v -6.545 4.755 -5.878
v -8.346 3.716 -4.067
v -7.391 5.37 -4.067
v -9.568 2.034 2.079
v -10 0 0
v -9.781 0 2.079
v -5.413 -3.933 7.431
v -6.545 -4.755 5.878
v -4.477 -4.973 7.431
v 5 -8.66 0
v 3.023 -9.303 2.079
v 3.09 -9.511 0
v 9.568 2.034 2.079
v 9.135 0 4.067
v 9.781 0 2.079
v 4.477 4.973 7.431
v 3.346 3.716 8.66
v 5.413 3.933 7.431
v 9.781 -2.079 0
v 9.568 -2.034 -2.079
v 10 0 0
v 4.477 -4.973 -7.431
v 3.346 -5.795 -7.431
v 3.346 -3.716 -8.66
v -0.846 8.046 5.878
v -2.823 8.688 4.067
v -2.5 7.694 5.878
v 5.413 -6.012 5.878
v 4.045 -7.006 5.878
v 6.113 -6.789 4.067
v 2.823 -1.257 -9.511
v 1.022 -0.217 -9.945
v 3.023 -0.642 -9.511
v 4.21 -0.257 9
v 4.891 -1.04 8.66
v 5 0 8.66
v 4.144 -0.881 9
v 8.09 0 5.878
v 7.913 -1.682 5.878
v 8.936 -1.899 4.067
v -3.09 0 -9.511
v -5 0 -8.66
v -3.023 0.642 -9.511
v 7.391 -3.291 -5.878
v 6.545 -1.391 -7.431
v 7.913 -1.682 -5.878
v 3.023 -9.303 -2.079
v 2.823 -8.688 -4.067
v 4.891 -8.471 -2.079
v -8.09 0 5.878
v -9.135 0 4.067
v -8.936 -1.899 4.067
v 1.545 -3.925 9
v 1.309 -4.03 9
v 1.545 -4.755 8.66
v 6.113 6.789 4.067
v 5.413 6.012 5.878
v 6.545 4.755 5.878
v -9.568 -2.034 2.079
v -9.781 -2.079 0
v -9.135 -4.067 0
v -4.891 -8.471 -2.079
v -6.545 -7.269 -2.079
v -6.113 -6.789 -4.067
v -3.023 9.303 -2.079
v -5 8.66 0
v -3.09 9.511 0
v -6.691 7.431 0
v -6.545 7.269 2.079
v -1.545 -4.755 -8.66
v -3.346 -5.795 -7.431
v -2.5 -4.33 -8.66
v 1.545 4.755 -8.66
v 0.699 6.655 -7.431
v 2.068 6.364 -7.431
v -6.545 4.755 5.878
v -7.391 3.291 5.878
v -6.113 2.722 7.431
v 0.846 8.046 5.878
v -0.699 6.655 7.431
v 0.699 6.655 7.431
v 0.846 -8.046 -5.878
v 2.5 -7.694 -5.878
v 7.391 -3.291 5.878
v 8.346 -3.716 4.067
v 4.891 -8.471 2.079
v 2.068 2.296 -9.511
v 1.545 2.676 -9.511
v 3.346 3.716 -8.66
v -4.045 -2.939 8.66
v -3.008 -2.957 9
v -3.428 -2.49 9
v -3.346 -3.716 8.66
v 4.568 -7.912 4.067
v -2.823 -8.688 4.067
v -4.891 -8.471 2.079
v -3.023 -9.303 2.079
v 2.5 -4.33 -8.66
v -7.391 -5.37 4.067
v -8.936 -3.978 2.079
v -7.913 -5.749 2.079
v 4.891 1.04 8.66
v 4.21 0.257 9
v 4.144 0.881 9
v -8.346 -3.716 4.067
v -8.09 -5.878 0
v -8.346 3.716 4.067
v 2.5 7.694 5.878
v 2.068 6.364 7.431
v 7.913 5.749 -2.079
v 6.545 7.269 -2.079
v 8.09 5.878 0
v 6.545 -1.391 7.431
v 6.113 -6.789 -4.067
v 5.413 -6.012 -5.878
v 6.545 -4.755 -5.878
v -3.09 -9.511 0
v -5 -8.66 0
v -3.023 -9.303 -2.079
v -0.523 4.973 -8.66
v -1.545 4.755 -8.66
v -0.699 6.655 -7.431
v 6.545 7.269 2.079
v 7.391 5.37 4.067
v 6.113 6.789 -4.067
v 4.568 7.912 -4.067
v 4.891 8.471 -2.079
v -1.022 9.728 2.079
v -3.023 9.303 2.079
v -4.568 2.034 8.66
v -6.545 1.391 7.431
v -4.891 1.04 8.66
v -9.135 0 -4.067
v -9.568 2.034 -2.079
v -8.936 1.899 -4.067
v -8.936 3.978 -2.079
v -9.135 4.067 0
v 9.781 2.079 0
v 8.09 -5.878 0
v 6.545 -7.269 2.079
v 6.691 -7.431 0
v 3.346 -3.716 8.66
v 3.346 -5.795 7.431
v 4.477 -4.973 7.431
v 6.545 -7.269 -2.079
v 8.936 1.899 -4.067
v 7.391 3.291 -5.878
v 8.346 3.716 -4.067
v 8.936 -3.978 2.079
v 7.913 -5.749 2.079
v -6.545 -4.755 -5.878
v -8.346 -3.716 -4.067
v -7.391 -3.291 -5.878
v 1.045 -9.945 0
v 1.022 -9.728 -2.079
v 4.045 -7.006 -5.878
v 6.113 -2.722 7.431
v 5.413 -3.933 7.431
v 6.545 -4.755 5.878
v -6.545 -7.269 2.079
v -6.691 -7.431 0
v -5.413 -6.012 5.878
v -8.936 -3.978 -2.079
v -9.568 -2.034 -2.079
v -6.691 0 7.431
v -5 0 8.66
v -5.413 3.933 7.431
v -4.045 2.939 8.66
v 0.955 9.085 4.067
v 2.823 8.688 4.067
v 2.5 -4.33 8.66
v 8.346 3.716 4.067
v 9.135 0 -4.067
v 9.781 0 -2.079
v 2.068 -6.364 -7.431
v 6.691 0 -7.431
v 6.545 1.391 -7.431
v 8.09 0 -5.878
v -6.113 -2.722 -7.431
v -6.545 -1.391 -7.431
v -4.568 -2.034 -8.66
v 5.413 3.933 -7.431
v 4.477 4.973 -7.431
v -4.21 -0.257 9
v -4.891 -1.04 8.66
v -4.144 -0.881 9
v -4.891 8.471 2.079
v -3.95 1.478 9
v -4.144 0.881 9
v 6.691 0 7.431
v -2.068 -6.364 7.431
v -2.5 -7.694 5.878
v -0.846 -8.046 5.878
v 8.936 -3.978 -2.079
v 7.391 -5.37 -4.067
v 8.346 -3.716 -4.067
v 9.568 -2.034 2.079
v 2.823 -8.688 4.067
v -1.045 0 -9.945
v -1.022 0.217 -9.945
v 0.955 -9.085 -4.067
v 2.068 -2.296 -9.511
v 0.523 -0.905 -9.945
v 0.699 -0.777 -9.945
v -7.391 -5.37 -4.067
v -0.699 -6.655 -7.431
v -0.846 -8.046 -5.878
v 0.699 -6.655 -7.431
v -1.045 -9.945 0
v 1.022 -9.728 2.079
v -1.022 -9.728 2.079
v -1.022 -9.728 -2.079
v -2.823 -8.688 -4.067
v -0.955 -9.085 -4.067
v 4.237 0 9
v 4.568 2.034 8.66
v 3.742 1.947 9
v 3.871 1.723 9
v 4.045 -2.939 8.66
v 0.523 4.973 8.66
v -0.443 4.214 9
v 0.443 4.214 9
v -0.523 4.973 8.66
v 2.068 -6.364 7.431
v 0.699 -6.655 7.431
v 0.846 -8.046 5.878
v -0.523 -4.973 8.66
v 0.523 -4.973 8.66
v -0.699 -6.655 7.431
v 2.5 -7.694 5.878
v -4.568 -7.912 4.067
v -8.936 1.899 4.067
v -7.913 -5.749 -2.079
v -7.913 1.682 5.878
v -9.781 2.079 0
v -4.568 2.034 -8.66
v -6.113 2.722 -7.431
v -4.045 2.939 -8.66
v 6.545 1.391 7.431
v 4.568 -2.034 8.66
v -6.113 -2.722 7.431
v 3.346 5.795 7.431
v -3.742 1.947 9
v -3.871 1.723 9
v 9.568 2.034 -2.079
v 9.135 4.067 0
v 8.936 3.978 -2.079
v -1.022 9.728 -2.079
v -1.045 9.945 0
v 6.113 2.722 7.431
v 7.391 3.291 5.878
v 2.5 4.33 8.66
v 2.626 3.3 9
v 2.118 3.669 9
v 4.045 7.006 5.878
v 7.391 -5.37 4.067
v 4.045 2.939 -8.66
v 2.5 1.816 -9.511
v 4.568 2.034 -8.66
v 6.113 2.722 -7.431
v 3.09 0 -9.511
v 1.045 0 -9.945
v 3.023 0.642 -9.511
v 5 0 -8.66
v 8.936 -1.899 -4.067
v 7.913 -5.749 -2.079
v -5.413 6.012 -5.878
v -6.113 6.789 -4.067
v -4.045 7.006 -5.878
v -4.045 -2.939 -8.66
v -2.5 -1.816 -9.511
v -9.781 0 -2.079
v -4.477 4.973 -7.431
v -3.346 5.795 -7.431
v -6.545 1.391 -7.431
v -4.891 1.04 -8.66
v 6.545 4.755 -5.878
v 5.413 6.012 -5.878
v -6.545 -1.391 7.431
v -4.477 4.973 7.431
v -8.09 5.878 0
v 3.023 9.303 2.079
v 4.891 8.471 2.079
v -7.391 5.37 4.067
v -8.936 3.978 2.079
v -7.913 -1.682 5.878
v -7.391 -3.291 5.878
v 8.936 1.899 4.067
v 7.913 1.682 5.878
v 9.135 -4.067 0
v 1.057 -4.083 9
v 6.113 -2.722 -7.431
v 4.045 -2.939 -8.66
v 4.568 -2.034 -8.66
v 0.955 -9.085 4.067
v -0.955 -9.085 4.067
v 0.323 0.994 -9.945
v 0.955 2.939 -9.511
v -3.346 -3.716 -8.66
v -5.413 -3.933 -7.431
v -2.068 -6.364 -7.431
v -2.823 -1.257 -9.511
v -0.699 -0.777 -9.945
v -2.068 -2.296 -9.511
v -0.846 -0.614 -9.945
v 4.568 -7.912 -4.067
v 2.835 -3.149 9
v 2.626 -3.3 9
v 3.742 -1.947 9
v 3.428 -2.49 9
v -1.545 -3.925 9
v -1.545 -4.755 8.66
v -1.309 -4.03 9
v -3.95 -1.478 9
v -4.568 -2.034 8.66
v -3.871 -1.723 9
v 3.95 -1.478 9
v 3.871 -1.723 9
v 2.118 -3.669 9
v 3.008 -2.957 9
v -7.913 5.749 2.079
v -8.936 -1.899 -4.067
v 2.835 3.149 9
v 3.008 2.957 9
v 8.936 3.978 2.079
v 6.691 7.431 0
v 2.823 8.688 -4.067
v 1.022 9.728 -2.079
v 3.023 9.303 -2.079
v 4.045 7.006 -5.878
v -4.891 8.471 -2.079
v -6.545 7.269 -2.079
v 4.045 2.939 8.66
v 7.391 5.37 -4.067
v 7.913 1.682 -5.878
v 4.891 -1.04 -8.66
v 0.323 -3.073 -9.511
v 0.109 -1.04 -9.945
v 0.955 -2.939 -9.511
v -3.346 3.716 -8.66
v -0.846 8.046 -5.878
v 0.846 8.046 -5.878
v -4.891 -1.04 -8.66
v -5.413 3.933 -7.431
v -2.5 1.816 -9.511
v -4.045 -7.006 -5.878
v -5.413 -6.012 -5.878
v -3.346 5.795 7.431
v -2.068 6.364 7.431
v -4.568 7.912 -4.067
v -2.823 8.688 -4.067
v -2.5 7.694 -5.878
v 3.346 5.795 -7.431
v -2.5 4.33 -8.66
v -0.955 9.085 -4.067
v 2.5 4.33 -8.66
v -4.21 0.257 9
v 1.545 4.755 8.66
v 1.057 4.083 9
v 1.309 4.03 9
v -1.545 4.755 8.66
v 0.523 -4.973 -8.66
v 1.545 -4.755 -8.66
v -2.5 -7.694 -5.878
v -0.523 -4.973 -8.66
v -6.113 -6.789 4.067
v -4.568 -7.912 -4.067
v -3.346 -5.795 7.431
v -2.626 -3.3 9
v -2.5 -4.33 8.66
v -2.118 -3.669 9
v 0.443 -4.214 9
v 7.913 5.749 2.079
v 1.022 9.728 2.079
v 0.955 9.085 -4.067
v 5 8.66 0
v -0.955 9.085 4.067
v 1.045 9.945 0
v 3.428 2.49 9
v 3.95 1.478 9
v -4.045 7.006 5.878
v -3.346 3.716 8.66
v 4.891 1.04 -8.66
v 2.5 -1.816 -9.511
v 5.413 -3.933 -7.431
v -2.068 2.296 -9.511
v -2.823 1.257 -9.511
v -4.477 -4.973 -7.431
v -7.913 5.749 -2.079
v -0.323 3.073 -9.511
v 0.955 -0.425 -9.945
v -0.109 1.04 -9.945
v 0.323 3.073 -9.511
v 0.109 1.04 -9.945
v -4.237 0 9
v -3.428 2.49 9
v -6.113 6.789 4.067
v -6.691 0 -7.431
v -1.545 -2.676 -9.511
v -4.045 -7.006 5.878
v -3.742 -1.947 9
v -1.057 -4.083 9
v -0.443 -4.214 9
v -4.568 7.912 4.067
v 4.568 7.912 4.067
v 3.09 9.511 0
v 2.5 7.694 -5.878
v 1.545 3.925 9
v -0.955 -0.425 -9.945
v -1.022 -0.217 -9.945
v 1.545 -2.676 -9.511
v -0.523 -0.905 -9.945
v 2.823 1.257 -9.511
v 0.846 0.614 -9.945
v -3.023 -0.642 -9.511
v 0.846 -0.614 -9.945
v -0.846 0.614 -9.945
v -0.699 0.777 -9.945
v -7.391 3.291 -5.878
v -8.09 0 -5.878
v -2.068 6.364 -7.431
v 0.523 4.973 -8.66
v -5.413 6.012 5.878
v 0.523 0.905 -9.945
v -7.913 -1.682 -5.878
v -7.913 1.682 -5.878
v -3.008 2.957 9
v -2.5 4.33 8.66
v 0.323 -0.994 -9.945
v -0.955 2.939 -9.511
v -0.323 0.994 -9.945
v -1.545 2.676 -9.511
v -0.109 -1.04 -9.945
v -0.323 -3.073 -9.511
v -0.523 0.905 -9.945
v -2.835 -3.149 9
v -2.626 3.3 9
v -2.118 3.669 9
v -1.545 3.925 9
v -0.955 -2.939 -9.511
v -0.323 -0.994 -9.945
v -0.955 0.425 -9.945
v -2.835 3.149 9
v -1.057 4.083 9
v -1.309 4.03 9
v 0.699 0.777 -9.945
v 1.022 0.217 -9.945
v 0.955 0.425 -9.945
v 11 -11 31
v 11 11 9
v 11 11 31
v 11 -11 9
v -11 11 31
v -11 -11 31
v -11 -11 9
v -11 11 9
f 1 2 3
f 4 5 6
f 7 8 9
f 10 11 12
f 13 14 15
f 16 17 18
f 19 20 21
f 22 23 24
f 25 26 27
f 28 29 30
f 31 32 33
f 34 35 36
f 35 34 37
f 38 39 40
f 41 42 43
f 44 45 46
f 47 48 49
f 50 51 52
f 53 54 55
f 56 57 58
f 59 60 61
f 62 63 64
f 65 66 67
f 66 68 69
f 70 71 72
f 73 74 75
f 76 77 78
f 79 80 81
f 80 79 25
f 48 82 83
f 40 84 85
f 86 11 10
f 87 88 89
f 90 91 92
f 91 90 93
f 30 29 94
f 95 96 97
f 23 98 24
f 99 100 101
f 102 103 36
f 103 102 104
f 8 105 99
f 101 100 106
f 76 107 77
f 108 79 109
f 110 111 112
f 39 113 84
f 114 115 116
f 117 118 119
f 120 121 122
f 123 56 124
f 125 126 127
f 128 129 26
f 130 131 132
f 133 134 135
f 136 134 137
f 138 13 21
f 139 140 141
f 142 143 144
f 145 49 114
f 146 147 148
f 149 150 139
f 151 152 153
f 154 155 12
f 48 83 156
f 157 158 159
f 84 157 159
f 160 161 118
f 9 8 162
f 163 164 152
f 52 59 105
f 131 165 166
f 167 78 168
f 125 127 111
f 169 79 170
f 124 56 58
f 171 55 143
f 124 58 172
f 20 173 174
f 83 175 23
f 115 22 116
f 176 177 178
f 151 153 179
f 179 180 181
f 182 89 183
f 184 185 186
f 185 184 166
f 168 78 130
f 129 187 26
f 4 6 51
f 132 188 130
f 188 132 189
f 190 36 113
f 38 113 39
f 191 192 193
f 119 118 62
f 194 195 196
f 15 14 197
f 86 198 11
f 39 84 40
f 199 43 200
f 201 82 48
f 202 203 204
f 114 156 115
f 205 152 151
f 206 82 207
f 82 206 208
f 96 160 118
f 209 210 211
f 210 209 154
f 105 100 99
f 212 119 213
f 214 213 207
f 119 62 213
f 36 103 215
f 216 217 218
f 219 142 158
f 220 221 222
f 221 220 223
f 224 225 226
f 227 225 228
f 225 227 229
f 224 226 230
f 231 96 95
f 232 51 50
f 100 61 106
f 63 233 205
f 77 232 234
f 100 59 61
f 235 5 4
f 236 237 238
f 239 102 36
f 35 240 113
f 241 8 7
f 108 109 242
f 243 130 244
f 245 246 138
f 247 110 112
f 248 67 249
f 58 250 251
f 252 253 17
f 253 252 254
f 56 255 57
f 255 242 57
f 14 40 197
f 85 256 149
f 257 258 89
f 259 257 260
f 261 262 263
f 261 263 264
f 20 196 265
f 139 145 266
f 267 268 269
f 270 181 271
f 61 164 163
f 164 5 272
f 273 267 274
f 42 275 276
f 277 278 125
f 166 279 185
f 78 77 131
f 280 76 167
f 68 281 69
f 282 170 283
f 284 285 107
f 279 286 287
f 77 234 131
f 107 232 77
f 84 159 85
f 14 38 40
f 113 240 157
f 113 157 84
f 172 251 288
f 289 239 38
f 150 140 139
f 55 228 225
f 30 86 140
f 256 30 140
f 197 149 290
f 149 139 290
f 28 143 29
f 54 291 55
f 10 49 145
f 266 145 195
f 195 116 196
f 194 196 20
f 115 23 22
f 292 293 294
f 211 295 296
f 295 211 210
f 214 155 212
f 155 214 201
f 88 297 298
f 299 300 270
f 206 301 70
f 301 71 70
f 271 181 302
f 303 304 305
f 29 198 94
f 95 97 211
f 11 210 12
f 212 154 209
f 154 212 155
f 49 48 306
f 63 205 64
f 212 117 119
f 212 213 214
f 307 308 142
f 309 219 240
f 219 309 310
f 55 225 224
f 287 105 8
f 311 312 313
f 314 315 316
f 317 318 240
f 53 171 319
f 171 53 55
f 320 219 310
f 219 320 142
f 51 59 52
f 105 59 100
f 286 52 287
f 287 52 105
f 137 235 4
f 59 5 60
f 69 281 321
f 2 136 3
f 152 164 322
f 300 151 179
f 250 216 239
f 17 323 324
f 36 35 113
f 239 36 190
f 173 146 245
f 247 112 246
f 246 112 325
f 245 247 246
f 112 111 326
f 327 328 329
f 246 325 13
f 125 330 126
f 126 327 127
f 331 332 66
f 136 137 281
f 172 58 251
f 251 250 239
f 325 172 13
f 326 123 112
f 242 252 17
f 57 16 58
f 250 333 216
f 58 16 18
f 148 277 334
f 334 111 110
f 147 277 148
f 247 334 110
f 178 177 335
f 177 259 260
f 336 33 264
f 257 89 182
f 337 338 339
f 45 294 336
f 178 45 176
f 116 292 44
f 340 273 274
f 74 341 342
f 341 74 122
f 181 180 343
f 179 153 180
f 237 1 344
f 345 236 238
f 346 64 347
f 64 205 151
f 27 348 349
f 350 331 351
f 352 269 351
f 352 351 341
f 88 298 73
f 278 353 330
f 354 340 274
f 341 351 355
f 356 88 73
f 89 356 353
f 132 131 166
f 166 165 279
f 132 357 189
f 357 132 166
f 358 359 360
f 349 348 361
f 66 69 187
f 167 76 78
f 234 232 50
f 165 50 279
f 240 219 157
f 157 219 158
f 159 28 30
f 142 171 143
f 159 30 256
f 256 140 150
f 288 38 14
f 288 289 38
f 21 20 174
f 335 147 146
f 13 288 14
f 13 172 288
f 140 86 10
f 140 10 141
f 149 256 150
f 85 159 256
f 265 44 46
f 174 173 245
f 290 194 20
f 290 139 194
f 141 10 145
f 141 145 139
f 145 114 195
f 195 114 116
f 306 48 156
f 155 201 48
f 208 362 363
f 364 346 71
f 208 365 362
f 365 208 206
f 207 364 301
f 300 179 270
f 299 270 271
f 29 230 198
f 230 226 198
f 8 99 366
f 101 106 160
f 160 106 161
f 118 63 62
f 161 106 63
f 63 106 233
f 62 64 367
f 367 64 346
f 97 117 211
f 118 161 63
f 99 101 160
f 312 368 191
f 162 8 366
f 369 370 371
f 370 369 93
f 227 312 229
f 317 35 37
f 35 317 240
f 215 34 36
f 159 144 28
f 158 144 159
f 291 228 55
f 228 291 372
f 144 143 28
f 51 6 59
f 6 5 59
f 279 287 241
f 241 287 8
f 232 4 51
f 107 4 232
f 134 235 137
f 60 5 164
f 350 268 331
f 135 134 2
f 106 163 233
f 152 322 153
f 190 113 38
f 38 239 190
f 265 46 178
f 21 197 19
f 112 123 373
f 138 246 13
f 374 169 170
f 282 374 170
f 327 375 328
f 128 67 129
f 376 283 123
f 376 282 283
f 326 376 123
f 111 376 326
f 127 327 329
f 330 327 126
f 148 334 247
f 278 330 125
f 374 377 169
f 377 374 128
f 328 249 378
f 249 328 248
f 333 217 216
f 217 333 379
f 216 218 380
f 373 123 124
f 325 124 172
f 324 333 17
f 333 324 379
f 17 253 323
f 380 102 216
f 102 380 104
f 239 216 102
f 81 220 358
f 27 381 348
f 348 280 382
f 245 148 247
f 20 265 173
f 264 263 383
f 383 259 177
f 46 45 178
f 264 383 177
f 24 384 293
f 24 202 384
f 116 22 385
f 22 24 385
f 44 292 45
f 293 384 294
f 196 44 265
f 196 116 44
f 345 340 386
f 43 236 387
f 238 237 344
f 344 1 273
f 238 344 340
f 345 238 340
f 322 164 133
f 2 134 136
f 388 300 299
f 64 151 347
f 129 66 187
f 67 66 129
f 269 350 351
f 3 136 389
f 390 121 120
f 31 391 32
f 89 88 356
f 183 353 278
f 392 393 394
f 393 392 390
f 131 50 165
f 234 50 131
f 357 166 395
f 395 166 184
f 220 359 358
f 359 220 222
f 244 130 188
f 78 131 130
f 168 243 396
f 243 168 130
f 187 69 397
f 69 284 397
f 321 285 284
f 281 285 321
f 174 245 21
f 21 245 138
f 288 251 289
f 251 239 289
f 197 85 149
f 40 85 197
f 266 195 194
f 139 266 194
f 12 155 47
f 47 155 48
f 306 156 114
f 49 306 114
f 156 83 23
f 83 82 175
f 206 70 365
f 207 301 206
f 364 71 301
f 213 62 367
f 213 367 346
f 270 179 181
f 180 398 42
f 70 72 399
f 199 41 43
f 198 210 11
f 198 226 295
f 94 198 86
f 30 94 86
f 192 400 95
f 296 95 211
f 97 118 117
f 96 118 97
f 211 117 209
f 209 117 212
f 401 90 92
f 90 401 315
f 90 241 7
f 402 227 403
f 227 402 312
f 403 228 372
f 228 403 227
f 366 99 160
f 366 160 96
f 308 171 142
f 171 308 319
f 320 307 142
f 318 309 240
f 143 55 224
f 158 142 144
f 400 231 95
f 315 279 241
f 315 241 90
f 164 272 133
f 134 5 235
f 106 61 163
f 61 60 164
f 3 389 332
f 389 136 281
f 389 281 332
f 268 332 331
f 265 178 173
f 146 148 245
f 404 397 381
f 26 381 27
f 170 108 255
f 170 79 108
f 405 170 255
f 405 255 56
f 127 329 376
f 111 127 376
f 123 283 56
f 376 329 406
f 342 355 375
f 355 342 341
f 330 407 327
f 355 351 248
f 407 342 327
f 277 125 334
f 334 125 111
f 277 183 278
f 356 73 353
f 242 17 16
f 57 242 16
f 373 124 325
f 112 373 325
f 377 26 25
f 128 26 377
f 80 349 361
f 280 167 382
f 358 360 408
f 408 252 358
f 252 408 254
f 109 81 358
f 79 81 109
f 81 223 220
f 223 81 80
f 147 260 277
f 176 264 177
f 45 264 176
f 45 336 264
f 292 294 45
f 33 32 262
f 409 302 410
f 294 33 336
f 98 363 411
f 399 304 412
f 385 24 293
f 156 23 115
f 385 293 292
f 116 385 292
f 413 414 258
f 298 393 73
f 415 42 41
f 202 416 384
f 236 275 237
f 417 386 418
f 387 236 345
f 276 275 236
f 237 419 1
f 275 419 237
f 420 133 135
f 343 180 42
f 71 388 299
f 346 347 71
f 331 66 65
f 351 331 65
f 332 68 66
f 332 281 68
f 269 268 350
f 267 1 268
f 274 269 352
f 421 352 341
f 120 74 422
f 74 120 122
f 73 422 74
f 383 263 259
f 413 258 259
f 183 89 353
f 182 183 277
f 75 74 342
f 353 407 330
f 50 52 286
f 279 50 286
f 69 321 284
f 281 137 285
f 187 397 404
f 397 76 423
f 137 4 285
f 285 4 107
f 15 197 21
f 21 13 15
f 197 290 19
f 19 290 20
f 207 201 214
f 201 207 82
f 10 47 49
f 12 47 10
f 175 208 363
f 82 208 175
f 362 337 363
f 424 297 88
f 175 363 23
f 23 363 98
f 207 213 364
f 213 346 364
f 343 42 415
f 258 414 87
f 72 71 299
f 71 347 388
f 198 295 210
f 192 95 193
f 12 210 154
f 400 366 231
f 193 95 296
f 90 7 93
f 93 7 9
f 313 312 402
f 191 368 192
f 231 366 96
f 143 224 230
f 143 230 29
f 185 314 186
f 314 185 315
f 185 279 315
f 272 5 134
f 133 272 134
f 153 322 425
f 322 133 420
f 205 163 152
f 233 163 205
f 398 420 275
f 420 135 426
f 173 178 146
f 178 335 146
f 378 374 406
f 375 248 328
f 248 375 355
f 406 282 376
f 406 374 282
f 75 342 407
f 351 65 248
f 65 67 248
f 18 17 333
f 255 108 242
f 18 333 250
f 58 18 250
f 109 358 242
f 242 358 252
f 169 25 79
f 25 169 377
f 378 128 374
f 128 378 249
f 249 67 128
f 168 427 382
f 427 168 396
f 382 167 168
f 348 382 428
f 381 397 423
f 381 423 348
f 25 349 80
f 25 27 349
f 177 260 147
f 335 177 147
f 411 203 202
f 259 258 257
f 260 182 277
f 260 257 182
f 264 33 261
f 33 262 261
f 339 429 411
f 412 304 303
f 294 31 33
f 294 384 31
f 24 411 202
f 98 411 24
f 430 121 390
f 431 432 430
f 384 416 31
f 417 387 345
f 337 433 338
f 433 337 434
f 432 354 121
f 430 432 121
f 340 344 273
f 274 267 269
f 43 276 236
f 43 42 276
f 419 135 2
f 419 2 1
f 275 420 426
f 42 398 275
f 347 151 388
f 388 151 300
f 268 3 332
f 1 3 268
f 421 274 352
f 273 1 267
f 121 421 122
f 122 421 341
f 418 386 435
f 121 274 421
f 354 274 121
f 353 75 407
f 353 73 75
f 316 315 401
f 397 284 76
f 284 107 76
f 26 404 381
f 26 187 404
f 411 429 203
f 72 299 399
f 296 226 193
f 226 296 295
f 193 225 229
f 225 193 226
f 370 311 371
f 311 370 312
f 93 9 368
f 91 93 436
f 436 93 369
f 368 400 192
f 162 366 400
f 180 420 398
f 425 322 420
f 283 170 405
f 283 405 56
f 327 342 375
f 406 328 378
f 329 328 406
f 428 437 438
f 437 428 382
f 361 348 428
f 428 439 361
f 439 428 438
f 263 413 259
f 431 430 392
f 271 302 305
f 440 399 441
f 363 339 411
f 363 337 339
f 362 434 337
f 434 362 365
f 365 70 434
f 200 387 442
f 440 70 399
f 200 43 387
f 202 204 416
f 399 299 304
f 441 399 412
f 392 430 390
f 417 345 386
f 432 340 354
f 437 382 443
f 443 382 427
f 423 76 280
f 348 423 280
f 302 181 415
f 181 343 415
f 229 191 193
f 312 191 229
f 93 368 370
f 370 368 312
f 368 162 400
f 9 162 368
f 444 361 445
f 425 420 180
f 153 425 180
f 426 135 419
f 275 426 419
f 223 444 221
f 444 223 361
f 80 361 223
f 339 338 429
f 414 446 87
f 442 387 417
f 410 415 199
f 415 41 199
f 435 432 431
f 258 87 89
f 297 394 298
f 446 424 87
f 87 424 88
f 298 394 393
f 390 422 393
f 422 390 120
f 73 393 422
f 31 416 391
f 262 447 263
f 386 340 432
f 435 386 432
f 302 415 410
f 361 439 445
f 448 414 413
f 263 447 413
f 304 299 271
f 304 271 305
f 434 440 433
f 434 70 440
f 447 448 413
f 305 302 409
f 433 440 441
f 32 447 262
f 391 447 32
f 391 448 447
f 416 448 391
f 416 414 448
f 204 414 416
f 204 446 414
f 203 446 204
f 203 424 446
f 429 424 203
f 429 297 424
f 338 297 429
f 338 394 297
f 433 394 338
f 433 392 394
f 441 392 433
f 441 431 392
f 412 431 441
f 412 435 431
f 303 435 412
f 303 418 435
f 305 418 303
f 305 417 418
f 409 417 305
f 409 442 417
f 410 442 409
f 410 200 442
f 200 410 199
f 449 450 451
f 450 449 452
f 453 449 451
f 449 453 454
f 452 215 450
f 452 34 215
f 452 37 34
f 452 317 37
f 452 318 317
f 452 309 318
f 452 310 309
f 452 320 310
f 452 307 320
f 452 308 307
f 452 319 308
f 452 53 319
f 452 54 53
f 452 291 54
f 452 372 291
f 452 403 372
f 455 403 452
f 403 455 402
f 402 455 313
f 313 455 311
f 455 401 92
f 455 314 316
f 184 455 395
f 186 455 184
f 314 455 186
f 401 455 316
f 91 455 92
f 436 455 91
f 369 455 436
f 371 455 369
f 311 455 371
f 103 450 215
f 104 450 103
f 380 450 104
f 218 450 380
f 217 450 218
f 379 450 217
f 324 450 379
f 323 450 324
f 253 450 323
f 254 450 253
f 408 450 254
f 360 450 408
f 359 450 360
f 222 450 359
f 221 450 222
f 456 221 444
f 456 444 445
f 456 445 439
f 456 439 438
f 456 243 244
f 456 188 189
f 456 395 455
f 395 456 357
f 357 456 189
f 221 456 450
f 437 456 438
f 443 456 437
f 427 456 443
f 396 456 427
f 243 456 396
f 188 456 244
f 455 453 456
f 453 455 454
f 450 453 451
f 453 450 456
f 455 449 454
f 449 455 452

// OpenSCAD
module loquesea(parametro)
{
    if(parametro % 2 == 0) //es par
    {
        sphere(parametro);
    }
    else
    {
        cube(2*parametro, center =true);                      
    }
}

loquesea(10);
translate([0,0,20])loquesea(11);
